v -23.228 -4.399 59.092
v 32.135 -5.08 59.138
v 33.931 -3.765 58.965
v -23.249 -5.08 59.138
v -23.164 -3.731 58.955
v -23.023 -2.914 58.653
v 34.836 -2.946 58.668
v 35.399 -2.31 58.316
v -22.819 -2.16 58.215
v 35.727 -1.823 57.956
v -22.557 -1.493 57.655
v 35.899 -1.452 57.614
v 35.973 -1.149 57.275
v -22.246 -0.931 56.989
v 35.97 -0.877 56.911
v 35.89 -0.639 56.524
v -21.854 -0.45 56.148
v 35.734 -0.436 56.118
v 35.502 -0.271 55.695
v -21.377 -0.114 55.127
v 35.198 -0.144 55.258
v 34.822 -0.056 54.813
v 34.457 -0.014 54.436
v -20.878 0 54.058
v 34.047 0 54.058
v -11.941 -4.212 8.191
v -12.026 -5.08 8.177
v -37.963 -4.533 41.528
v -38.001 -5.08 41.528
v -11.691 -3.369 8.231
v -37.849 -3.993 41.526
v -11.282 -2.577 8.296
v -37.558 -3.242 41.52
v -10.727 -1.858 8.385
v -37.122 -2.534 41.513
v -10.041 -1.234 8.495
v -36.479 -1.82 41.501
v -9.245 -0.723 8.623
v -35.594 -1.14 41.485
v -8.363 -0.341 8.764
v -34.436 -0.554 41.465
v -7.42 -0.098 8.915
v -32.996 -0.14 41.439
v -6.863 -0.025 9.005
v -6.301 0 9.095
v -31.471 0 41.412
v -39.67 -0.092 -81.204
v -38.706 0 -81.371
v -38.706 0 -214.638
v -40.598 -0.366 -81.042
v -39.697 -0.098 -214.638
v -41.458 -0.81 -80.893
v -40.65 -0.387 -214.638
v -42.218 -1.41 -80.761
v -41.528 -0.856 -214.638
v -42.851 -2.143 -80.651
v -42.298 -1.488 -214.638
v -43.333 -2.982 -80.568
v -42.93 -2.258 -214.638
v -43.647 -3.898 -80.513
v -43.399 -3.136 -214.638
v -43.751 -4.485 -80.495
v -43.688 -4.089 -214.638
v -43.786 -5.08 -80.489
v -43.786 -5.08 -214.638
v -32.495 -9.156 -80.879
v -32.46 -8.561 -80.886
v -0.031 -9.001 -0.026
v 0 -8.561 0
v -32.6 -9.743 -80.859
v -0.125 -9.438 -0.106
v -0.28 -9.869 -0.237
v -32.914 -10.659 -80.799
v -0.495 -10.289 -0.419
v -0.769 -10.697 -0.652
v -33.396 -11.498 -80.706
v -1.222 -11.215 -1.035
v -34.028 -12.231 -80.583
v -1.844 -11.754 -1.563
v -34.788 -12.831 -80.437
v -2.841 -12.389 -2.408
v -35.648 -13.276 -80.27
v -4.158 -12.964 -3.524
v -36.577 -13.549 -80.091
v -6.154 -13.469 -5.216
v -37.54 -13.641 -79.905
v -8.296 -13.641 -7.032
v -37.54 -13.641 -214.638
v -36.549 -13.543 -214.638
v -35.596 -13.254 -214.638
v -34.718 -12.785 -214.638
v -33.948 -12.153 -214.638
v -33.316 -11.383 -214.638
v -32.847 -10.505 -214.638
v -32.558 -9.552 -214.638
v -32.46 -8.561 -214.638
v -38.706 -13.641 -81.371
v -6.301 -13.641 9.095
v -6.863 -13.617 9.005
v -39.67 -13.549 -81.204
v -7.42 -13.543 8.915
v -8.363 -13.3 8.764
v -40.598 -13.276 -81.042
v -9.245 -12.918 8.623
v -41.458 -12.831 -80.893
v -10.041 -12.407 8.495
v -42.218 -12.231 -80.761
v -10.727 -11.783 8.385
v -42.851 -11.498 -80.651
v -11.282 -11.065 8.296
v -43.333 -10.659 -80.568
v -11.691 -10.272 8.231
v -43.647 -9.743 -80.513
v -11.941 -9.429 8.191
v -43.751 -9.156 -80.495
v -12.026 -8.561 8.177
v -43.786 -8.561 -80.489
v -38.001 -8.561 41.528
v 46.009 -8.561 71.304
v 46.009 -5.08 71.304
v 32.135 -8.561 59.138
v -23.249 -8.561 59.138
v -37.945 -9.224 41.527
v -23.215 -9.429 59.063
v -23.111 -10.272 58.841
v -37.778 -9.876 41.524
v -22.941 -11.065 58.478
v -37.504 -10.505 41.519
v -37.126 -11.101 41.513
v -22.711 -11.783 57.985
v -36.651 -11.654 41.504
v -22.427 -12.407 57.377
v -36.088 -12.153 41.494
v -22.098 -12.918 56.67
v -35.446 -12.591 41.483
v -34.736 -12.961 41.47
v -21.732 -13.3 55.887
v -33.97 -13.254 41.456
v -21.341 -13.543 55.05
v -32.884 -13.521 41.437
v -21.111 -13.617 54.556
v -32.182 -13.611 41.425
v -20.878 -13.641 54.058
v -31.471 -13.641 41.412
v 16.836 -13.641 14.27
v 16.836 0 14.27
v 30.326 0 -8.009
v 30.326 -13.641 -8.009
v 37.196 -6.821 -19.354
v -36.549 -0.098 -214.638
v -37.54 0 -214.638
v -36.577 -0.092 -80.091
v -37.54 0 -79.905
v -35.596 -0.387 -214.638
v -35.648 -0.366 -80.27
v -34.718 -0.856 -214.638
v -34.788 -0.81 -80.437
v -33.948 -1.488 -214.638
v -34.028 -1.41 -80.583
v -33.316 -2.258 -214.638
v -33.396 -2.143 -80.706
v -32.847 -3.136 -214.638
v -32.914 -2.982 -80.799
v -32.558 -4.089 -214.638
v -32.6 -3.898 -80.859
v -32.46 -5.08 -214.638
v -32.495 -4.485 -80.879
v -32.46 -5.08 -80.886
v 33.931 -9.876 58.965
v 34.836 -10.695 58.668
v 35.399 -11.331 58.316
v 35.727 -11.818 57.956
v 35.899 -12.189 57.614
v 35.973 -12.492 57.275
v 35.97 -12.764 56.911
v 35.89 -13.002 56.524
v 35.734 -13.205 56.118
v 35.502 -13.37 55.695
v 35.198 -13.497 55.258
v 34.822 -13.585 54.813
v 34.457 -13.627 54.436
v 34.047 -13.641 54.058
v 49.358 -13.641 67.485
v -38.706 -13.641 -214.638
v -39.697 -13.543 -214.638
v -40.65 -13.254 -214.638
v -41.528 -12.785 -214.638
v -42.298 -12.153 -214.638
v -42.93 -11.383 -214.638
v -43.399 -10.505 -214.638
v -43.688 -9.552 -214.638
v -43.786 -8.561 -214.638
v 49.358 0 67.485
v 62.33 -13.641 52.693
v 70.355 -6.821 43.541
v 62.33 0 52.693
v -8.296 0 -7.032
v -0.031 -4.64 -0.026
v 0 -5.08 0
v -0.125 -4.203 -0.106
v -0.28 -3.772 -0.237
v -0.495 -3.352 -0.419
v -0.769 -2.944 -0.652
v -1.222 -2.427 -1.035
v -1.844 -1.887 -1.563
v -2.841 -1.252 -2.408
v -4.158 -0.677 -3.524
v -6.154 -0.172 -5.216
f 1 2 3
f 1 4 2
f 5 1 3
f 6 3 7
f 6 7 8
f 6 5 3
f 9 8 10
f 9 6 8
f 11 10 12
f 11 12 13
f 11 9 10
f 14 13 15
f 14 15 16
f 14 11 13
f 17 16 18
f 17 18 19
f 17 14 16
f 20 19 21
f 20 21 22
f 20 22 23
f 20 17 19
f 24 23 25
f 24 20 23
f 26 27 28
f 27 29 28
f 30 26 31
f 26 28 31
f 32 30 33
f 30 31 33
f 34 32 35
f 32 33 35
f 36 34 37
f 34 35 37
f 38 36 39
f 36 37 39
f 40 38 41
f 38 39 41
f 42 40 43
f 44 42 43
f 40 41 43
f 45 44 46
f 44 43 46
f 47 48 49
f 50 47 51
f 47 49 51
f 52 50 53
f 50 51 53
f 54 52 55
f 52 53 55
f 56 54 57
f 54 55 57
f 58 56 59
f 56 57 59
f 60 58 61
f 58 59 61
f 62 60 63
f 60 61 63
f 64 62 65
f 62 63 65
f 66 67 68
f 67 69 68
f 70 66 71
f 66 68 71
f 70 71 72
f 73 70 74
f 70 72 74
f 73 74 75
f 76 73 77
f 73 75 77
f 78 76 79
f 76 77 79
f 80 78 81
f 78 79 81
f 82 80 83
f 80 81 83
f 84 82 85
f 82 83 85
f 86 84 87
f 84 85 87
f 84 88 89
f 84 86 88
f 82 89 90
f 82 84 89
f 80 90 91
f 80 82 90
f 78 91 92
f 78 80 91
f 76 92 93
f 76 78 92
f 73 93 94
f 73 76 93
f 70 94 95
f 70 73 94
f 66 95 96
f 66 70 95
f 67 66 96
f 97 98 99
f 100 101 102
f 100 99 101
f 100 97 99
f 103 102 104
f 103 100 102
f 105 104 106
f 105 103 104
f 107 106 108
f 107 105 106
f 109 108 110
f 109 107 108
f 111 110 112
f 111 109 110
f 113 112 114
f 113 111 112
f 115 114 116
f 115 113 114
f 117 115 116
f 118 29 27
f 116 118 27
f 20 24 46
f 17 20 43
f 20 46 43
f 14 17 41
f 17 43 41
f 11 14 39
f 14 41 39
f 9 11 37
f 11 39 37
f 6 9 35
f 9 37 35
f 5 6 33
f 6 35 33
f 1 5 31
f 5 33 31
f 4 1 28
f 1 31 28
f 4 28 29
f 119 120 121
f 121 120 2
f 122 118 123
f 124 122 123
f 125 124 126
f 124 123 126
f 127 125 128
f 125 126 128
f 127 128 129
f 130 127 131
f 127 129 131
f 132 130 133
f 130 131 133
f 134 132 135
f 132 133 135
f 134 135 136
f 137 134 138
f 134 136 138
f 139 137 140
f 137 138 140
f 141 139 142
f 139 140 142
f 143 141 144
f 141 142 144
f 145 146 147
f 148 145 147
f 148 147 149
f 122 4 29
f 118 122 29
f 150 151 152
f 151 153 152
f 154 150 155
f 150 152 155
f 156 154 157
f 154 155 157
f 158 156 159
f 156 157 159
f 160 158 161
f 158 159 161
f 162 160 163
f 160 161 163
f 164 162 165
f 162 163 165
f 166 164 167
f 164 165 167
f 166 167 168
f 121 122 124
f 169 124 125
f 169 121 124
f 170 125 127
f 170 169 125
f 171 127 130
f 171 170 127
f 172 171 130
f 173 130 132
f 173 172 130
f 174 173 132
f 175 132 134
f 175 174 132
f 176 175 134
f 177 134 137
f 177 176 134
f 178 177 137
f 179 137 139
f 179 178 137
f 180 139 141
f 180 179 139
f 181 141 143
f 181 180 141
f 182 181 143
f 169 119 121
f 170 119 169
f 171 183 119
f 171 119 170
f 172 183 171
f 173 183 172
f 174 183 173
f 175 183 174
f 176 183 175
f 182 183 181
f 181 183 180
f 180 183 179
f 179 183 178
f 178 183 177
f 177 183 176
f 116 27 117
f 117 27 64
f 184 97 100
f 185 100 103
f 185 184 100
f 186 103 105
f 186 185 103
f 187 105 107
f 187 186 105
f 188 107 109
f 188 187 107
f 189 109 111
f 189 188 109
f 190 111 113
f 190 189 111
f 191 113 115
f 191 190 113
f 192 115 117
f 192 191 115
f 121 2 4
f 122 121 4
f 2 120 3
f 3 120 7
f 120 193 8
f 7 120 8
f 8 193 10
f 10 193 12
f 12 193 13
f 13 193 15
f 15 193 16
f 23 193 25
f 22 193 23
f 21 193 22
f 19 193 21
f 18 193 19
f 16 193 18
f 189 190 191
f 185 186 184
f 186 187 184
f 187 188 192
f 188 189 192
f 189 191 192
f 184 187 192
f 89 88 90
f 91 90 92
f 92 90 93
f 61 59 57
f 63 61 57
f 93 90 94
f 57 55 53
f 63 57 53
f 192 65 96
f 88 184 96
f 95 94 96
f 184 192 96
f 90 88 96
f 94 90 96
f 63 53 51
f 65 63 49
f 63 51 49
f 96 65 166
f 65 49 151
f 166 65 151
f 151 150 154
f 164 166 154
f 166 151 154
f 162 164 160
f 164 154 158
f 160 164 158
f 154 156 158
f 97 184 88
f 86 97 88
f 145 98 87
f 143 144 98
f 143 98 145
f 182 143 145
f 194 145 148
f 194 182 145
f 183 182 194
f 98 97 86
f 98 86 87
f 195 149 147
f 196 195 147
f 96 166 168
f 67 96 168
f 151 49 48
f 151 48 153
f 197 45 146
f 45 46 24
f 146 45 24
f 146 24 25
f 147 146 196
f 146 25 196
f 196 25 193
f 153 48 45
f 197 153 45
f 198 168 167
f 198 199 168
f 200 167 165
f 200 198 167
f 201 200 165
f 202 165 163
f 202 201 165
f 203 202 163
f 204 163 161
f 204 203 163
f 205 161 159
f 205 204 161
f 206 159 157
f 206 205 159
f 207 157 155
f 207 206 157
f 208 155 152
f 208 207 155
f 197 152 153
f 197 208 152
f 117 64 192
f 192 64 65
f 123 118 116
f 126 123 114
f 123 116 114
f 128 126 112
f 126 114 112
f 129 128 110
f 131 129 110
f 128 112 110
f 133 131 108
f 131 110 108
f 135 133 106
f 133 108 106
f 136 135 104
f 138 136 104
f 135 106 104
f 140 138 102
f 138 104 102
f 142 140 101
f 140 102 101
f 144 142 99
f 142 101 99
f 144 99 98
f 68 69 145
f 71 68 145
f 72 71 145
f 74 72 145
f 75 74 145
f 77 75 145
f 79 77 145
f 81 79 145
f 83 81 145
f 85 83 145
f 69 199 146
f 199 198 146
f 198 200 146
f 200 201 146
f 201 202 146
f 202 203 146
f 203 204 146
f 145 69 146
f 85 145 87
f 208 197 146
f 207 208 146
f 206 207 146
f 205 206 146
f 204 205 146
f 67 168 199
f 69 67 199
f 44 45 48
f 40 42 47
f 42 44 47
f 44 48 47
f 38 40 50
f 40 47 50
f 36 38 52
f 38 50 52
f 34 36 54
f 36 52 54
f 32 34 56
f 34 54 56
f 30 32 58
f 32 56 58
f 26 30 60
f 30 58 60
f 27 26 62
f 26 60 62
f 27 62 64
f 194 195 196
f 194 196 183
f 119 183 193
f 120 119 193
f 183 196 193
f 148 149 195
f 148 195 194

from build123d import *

# Parameters (mm, degrees)
F1_DEPTH    = 13.64111
F2_T1_DEPTH = 137.0825914491
F3_R        = 5.08
F4_SIZE     = 5.08
F5_R        = 5.08


# Not quite as in the source:
# - a fillet or chamfer that OpenCascade refuses, or shapes differently, is made with other operations: its cross-section is extruded or revolved along the edge and cut away or added


with BuildPart() as f1:
    # F0 (on Front) → F1 (new body)
    with BuildSketch(Plane.XZ):
        Polygon((0, 0), (16.8357715011, 14.2703205347), (38.0007438362, -20.6839479506), (71.29599154, 42.4681007862), (46.0088496082, 71.3043088503), (32.1346404756, 59.1376919794), (-23.249398917, 59.1376919794), (-38.0007401109, 41.5282361209), (-12.0255500078, 8.1773754209), (-43.7860488892, -80.4887861013), (-32.4603319168, -80.8862298727), align=None)
        Polygon((-32.4603319168, -214.6375030279), (-32.4603319168, -80.8862298727), (-43.7860488892, -80.4887861013), (-43.7860488892, -214.6375030279), align=None)
    extrude(amount=F1_DEPTH)

    # F2: chamfer of 7.62 x 12.7 on 2 edges, made by hand

    # F2_s2 → F2_t1 (cut)
    with BuildSketch(Plane(origin=(-15.5861012637, 0, -29.5626041102), x_dir=(0, 1, 0), z_dir=(0.4663751275, 0, 0.8845870451))):
        Polygon((-6.02111, -43.2614445663), (-13.64111, -30.5614445663), (-13.64111, -43.2614445663), align=None)
        Polygon((-7.62, -43.2614445663), (0, -30.5614445663), (0, -43.2614445663), align=None)
    extrude(amount=F2_T1_DEPTH, mode=Mode.SUBTRACT)

    # F3
    f3_edges = [f1.edges().sort_by_distance(p)[0] for p in [
        (-32.460332, -13.64111, -147.761866),
        (-32.460332, 0, -147.761866),
        (-43.786049, -13.64111, -147.563145),
        (-43.786049, 0, -147.563145),
        (-16.230166, -13.64111, -40.443115),
        (-27.905799, -13.64111, -36.155705),
        (-27.905799, 0, -36.155705),
        (-16.230166, 0, -40.443115),
    ]]
    fillet(f3_edges, radius=F3_R)

    # F4
    f4_edges = [f1.edges().sort_by_distance(p)[0] for p in [
        (39.071745, -13.64111, 65.221),
        (39.071745, 0, 65.221),
    ]]
    chamfer(f4_edges, length=F4_SIZE)

    # F5
    f5_edges = [f1.edges().sort_by_distance(p)[0] for p in [
        (-30.62507, -13.64111, 50.332964),
        (-30.62507, 0, 50.332964),
        (-25.013145, 0, 24.852806),
        (-25.013145, -13.64111, 24.852806),
        (4.442621, -13.64111, 59.137692),
        (4.442621, 0, 59.137692),
    ]]
    fillet(f5_edges, radius=F5_R)


solid = f1.part
